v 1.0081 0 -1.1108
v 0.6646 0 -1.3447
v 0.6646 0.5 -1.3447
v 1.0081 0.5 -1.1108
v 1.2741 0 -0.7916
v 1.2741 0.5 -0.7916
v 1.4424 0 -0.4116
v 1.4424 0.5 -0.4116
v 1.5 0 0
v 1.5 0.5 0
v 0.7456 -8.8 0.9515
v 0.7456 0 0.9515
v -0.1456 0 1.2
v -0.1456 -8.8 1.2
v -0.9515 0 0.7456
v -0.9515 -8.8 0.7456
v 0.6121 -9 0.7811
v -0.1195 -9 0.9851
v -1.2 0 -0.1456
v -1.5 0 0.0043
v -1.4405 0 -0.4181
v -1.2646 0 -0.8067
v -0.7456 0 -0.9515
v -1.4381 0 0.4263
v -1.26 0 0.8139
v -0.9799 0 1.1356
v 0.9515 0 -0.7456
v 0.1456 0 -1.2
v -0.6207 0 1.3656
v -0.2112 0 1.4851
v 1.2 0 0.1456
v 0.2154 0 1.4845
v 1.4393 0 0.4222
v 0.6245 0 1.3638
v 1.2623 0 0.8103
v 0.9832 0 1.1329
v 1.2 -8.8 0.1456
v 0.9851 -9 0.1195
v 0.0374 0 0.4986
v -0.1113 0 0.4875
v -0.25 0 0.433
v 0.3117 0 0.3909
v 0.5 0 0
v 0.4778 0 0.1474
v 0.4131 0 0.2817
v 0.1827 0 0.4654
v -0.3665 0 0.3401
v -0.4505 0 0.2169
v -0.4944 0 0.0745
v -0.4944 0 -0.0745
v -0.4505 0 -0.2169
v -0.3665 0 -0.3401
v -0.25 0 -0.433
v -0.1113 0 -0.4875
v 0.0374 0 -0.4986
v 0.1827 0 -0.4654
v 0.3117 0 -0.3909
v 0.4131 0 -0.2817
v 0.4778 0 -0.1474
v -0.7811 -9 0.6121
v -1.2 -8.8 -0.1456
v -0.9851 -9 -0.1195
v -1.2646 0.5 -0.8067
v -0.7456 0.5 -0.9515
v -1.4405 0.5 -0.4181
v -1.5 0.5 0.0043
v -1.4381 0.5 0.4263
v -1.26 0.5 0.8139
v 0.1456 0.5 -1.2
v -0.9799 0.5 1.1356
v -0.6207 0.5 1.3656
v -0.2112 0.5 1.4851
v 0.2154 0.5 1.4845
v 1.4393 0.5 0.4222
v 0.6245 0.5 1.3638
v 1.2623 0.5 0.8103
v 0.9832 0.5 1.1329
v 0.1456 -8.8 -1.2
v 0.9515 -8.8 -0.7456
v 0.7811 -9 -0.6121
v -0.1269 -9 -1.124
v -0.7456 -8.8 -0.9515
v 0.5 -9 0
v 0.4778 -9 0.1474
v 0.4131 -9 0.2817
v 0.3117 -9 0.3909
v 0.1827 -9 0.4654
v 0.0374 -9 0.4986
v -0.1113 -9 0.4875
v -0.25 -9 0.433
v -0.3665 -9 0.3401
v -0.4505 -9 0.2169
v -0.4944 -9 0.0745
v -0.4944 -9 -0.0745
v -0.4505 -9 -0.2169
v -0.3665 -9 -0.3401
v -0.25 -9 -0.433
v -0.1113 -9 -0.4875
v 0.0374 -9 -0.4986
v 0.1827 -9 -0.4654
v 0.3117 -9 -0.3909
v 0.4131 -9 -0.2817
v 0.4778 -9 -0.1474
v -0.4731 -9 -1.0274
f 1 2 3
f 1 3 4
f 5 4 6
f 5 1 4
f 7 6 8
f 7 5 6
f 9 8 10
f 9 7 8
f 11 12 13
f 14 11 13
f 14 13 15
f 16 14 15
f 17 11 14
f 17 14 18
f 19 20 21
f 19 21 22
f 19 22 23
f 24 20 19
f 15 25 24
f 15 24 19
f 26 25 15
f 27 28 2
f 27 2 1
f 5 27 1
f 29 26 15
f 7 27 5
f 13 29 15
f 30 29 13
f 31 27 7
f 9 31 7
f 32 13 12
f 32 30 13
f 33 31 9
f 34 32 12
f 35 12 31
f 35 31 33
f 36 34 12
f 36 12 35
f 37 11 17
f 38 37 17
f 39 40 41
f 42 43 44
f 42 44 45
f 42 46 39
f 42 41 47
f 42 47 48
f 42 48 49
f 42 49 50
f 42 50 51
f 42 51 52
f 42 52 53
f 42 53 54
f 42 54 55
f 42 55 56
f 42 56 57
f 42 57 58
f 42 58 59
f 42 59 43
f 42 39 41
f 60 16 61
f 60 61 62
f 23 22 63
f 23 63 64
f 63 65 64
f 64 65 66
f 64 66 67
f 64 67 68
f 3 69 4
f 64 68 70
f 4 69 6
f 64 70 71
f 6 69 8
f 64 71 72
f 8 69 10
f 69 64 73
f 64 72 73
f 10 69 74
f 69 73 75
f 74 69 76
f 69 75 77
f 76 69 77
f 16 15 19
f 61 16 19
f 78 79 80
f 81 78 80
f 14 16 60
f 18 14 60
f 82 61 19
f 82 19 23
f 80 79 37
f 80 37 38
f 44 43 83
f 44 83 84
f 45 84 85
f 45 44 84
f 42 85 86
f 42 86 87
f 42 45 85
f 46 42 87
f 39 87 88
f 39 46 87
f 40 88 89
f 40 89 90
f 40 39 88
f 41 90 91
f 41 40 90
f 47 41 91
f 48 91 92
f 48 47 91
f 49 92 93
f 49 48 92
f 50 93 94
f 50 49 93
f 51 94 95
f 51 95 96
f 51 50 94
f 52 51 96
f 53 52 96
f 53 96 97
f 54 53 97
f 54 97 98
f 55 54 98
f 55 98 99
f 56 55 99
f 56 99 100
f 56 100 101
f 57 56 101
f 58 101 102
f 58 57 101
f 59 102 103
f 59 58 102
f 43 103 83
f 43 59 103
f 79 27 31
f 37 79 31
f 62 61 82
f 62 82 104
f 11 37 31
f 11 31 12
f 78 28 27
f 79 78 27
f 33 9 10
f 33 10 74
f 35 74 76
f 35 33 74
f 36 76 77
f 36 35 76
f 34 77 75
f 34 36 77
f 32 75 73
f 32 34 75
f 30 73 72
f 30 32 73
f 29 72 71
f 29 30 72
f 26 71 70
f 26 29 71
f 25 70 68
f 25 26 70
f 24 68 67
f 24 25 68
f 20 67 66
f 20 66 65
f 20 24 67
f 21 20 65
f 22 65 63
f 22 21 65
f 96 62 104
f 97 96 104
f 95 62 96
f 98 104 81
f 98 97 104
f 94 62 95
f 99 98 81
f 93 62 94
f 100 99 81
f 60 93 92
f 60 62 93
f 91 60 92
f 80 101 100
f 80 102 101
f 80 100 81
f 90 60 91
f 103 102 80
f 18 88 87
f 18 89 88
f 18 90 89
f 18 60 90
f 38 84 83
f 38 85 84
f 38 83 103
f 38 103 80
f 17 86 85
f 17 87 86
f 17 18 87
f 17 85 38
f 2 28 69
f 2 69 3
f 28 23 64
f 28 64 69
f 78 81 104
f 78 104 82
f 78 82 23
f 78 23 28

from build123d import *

# Parameters (mm, degrees)
F0_R         = 0.5
F1_DEPTH     = 9
F2_T1_DEPTH  = 1.9538472674
F2_T3_DEPTH  = 1.9538472674
F2_T5_DEPTH  = 1.9538472674
F2_T7_DEPTH  = 1.9538472674
F2_T9_DEPTH  = 1.9538472674
F2_T11_DEPTH = 1.9538472674
F2_T13_DEPTH = 1.9538472674
F3_DEPTH     = 0.5


# Not quite as in the source:
# - a fillet or chamfer that OpenCascade refuses, or shapes differently, is made with other operations: its cross-section is extruded or revolved along the edge and cut away or added


with BuildPart() as f1:
    # F0 (on Front) → F1 (new body)
    with BuildSketch(Plane.XZ):
        Polygon((1.2, 0.1455782856), (0.7455887445, 0.9514675304), (-0.1455782856, 1.2), (-0.9514675304, 0.7455887445), (-1.2, -0.1455782856), (-0.7455887445, -0.9514675304), (0.1455782856, -1.2), (0.9514675304, -0.7455887445), align=None)
        Circle(F0_R, mode=Mode.SUBTRACT)
    extrude(amount=F1_DEPTH)

    # F2: chamfer of 0.2 on 8 edges, made by hand

    # F2_s2 → F2_t1 (cut)
    with BuildSketch(Plane(origin=(0.8509666159, 0, 0.4798287244), x_dir=(0, 1, 0), z_dir=(-0.871067693, 0, -0.4911629813))):
        Polygon((-8.8, -1.1167838964), (-9, -0.9167838964), (-9, -1.1167838964), align=None)
    extrude(amount=F2_T1_DEPTH, mode=Mode.SUBTRACT)

    # F2_s4 → F2_t3 (cut)
    with BuildSketch(Plane(origin=(0.2624341198, 0, 0.9410144095), x_dir=(0, 1, 0), z_dir=(-0.2686331979, 0, -0.9632425473))):
        Polygon((-8.8, -1.1167838964), (-9, -0.9167838964), (-9, -1.1167838964), align=None)
    extrude(amount=F2_T3_DEPTH, mode=Mode.SUBTRACT)

    # F2_s6 → F2_t5 (cut)
    with BuildSketch(Plane(origin=(-0.4798287244, 0, 0.8509666159), x_dir=(0, 1, 0), z_dir=(0.4911629813, 0, -0.871067693))):
        Polygon((-8.8, -1.1167838964), (-9, -0.9167838964), (-9, -1.1167838964), align=None)
    extrude(amount=F2_T5_DEPTH, mode=Mode.SUBTRACT)

    # F2_s8 → F2_t7 (cut)
    with BuildSketch(Plane(origin=(-0.8509666159, 0, -0.4798287244), x_dir=(0, 1, 0), z_dir=(0.871067693, 0, 0.4911629813))):
        Polygon((-8.8, -1.1167838964), (-9, -0.9167838964), (-9, -1.1167838964), align=None)
    extrude(amount=F2_T7_DEPTH, mode=Mode.SUBTRACT)

    # F2_s10 → F2_t9 (cut)
    with BuildSketch(Plane(origin=(-0.2624341198, 0, -0.9410144095), x_dir=(0, 1, 0), z_dir=(0.2686331979, 0, 0.9632425473))):
        Polygon((-8.8, -1.1167838964), (-9, -0.9167838964), (-9, -1.1167838964), align=None)
    extrude(amount=F2_T9_DEPTH, mode=Mode.SUBTRACT)

    # F2_s12 → F2_t11 (cut)
    with BuildSketch(Plane(origin=(0.4798287244, 0, -0.8509666159), x_dir=(0, 1, 0), z_dir=(-0.4911629813, 0, 0.871067693))):
        Polygon((-8.8, -1.1167838964), (-9, -0.9167838964), (-9, -1.1167838964), align=None)
    extrude(amount=F2_T11_DEPTH, mode=Mode.SUBTRACT)

    # F2_s14 → F2_t13 (cut)
    with BuildSketch(Plane(origin=(0.9410144095, 0, -0.2624341198), x_dir=(0, 1, 0), z_dir=(-0.9632425473, 0, 0.2686331979))):
        Polygon((-8.8, -1.1167838964), (-9, -0.9167838964), (-9, -1.1167838964), align=None)
    extrude(amount=F2_T13_DEPTH, mode=Mode.SUBTRACT)

    # F0 (on Front) → F3 (join)
    with BuildSketch(Plane.XZ):
        with BuildLine():
            Line((-0.1455782856, 1.2), (0.7455887445, 0.9514675304))
            Line((0.7455887445, 0.9514675304), (1.2, 0.1455782856))
            Line((1.2, 0.1455782856), (0.9514675304, -0.7455887445))
            Line((0.9514675304, -0.7455887445), (0.1455782856, -1.2))
            Line((0.1455782856, -1.2), (0.6645818987, -1.3447419455))
            ThreePointArc((0.6645818987, -1.3447419455), (1.2741414458, -0.7915576896), (1.5, 0))
            ThreePointArc((1.5, 0), (-0.4201853542, 1.4399459254), (-1.2645923575, -0.8067255849))
            Line((-1.2645923575, -0.8067255849), (-0.7455887445, -0.9514675304))
            Line((-0.7455887445, -0.9514675304), (-1.2, -0.1455782856))
            Line((-1.2, -0.1455782856), (-0.9514675304, 0.7455887445))
            Line((-0.9514675304, 0.7455887445), (-0.1455782856, 1.2))
        make_face()
        Polygon((1.2, 0.1455782856), (0.7455887445, 0.9514675304), (-0.1455782856, 1.2), (-0.9514675304, 0.7455887445), (-1.2, -0.1455782856), (-0.7455887445, -0.9514675304), (0.1455782856, -1.2), (0.9514675304, -0.7455887445), align=None)
        Circle(F0_R, mode=Mode.SUBTRACT)
        Circle(F0_R)
    extrude(amount=-F3_DEPTH)


solid = f1.part
